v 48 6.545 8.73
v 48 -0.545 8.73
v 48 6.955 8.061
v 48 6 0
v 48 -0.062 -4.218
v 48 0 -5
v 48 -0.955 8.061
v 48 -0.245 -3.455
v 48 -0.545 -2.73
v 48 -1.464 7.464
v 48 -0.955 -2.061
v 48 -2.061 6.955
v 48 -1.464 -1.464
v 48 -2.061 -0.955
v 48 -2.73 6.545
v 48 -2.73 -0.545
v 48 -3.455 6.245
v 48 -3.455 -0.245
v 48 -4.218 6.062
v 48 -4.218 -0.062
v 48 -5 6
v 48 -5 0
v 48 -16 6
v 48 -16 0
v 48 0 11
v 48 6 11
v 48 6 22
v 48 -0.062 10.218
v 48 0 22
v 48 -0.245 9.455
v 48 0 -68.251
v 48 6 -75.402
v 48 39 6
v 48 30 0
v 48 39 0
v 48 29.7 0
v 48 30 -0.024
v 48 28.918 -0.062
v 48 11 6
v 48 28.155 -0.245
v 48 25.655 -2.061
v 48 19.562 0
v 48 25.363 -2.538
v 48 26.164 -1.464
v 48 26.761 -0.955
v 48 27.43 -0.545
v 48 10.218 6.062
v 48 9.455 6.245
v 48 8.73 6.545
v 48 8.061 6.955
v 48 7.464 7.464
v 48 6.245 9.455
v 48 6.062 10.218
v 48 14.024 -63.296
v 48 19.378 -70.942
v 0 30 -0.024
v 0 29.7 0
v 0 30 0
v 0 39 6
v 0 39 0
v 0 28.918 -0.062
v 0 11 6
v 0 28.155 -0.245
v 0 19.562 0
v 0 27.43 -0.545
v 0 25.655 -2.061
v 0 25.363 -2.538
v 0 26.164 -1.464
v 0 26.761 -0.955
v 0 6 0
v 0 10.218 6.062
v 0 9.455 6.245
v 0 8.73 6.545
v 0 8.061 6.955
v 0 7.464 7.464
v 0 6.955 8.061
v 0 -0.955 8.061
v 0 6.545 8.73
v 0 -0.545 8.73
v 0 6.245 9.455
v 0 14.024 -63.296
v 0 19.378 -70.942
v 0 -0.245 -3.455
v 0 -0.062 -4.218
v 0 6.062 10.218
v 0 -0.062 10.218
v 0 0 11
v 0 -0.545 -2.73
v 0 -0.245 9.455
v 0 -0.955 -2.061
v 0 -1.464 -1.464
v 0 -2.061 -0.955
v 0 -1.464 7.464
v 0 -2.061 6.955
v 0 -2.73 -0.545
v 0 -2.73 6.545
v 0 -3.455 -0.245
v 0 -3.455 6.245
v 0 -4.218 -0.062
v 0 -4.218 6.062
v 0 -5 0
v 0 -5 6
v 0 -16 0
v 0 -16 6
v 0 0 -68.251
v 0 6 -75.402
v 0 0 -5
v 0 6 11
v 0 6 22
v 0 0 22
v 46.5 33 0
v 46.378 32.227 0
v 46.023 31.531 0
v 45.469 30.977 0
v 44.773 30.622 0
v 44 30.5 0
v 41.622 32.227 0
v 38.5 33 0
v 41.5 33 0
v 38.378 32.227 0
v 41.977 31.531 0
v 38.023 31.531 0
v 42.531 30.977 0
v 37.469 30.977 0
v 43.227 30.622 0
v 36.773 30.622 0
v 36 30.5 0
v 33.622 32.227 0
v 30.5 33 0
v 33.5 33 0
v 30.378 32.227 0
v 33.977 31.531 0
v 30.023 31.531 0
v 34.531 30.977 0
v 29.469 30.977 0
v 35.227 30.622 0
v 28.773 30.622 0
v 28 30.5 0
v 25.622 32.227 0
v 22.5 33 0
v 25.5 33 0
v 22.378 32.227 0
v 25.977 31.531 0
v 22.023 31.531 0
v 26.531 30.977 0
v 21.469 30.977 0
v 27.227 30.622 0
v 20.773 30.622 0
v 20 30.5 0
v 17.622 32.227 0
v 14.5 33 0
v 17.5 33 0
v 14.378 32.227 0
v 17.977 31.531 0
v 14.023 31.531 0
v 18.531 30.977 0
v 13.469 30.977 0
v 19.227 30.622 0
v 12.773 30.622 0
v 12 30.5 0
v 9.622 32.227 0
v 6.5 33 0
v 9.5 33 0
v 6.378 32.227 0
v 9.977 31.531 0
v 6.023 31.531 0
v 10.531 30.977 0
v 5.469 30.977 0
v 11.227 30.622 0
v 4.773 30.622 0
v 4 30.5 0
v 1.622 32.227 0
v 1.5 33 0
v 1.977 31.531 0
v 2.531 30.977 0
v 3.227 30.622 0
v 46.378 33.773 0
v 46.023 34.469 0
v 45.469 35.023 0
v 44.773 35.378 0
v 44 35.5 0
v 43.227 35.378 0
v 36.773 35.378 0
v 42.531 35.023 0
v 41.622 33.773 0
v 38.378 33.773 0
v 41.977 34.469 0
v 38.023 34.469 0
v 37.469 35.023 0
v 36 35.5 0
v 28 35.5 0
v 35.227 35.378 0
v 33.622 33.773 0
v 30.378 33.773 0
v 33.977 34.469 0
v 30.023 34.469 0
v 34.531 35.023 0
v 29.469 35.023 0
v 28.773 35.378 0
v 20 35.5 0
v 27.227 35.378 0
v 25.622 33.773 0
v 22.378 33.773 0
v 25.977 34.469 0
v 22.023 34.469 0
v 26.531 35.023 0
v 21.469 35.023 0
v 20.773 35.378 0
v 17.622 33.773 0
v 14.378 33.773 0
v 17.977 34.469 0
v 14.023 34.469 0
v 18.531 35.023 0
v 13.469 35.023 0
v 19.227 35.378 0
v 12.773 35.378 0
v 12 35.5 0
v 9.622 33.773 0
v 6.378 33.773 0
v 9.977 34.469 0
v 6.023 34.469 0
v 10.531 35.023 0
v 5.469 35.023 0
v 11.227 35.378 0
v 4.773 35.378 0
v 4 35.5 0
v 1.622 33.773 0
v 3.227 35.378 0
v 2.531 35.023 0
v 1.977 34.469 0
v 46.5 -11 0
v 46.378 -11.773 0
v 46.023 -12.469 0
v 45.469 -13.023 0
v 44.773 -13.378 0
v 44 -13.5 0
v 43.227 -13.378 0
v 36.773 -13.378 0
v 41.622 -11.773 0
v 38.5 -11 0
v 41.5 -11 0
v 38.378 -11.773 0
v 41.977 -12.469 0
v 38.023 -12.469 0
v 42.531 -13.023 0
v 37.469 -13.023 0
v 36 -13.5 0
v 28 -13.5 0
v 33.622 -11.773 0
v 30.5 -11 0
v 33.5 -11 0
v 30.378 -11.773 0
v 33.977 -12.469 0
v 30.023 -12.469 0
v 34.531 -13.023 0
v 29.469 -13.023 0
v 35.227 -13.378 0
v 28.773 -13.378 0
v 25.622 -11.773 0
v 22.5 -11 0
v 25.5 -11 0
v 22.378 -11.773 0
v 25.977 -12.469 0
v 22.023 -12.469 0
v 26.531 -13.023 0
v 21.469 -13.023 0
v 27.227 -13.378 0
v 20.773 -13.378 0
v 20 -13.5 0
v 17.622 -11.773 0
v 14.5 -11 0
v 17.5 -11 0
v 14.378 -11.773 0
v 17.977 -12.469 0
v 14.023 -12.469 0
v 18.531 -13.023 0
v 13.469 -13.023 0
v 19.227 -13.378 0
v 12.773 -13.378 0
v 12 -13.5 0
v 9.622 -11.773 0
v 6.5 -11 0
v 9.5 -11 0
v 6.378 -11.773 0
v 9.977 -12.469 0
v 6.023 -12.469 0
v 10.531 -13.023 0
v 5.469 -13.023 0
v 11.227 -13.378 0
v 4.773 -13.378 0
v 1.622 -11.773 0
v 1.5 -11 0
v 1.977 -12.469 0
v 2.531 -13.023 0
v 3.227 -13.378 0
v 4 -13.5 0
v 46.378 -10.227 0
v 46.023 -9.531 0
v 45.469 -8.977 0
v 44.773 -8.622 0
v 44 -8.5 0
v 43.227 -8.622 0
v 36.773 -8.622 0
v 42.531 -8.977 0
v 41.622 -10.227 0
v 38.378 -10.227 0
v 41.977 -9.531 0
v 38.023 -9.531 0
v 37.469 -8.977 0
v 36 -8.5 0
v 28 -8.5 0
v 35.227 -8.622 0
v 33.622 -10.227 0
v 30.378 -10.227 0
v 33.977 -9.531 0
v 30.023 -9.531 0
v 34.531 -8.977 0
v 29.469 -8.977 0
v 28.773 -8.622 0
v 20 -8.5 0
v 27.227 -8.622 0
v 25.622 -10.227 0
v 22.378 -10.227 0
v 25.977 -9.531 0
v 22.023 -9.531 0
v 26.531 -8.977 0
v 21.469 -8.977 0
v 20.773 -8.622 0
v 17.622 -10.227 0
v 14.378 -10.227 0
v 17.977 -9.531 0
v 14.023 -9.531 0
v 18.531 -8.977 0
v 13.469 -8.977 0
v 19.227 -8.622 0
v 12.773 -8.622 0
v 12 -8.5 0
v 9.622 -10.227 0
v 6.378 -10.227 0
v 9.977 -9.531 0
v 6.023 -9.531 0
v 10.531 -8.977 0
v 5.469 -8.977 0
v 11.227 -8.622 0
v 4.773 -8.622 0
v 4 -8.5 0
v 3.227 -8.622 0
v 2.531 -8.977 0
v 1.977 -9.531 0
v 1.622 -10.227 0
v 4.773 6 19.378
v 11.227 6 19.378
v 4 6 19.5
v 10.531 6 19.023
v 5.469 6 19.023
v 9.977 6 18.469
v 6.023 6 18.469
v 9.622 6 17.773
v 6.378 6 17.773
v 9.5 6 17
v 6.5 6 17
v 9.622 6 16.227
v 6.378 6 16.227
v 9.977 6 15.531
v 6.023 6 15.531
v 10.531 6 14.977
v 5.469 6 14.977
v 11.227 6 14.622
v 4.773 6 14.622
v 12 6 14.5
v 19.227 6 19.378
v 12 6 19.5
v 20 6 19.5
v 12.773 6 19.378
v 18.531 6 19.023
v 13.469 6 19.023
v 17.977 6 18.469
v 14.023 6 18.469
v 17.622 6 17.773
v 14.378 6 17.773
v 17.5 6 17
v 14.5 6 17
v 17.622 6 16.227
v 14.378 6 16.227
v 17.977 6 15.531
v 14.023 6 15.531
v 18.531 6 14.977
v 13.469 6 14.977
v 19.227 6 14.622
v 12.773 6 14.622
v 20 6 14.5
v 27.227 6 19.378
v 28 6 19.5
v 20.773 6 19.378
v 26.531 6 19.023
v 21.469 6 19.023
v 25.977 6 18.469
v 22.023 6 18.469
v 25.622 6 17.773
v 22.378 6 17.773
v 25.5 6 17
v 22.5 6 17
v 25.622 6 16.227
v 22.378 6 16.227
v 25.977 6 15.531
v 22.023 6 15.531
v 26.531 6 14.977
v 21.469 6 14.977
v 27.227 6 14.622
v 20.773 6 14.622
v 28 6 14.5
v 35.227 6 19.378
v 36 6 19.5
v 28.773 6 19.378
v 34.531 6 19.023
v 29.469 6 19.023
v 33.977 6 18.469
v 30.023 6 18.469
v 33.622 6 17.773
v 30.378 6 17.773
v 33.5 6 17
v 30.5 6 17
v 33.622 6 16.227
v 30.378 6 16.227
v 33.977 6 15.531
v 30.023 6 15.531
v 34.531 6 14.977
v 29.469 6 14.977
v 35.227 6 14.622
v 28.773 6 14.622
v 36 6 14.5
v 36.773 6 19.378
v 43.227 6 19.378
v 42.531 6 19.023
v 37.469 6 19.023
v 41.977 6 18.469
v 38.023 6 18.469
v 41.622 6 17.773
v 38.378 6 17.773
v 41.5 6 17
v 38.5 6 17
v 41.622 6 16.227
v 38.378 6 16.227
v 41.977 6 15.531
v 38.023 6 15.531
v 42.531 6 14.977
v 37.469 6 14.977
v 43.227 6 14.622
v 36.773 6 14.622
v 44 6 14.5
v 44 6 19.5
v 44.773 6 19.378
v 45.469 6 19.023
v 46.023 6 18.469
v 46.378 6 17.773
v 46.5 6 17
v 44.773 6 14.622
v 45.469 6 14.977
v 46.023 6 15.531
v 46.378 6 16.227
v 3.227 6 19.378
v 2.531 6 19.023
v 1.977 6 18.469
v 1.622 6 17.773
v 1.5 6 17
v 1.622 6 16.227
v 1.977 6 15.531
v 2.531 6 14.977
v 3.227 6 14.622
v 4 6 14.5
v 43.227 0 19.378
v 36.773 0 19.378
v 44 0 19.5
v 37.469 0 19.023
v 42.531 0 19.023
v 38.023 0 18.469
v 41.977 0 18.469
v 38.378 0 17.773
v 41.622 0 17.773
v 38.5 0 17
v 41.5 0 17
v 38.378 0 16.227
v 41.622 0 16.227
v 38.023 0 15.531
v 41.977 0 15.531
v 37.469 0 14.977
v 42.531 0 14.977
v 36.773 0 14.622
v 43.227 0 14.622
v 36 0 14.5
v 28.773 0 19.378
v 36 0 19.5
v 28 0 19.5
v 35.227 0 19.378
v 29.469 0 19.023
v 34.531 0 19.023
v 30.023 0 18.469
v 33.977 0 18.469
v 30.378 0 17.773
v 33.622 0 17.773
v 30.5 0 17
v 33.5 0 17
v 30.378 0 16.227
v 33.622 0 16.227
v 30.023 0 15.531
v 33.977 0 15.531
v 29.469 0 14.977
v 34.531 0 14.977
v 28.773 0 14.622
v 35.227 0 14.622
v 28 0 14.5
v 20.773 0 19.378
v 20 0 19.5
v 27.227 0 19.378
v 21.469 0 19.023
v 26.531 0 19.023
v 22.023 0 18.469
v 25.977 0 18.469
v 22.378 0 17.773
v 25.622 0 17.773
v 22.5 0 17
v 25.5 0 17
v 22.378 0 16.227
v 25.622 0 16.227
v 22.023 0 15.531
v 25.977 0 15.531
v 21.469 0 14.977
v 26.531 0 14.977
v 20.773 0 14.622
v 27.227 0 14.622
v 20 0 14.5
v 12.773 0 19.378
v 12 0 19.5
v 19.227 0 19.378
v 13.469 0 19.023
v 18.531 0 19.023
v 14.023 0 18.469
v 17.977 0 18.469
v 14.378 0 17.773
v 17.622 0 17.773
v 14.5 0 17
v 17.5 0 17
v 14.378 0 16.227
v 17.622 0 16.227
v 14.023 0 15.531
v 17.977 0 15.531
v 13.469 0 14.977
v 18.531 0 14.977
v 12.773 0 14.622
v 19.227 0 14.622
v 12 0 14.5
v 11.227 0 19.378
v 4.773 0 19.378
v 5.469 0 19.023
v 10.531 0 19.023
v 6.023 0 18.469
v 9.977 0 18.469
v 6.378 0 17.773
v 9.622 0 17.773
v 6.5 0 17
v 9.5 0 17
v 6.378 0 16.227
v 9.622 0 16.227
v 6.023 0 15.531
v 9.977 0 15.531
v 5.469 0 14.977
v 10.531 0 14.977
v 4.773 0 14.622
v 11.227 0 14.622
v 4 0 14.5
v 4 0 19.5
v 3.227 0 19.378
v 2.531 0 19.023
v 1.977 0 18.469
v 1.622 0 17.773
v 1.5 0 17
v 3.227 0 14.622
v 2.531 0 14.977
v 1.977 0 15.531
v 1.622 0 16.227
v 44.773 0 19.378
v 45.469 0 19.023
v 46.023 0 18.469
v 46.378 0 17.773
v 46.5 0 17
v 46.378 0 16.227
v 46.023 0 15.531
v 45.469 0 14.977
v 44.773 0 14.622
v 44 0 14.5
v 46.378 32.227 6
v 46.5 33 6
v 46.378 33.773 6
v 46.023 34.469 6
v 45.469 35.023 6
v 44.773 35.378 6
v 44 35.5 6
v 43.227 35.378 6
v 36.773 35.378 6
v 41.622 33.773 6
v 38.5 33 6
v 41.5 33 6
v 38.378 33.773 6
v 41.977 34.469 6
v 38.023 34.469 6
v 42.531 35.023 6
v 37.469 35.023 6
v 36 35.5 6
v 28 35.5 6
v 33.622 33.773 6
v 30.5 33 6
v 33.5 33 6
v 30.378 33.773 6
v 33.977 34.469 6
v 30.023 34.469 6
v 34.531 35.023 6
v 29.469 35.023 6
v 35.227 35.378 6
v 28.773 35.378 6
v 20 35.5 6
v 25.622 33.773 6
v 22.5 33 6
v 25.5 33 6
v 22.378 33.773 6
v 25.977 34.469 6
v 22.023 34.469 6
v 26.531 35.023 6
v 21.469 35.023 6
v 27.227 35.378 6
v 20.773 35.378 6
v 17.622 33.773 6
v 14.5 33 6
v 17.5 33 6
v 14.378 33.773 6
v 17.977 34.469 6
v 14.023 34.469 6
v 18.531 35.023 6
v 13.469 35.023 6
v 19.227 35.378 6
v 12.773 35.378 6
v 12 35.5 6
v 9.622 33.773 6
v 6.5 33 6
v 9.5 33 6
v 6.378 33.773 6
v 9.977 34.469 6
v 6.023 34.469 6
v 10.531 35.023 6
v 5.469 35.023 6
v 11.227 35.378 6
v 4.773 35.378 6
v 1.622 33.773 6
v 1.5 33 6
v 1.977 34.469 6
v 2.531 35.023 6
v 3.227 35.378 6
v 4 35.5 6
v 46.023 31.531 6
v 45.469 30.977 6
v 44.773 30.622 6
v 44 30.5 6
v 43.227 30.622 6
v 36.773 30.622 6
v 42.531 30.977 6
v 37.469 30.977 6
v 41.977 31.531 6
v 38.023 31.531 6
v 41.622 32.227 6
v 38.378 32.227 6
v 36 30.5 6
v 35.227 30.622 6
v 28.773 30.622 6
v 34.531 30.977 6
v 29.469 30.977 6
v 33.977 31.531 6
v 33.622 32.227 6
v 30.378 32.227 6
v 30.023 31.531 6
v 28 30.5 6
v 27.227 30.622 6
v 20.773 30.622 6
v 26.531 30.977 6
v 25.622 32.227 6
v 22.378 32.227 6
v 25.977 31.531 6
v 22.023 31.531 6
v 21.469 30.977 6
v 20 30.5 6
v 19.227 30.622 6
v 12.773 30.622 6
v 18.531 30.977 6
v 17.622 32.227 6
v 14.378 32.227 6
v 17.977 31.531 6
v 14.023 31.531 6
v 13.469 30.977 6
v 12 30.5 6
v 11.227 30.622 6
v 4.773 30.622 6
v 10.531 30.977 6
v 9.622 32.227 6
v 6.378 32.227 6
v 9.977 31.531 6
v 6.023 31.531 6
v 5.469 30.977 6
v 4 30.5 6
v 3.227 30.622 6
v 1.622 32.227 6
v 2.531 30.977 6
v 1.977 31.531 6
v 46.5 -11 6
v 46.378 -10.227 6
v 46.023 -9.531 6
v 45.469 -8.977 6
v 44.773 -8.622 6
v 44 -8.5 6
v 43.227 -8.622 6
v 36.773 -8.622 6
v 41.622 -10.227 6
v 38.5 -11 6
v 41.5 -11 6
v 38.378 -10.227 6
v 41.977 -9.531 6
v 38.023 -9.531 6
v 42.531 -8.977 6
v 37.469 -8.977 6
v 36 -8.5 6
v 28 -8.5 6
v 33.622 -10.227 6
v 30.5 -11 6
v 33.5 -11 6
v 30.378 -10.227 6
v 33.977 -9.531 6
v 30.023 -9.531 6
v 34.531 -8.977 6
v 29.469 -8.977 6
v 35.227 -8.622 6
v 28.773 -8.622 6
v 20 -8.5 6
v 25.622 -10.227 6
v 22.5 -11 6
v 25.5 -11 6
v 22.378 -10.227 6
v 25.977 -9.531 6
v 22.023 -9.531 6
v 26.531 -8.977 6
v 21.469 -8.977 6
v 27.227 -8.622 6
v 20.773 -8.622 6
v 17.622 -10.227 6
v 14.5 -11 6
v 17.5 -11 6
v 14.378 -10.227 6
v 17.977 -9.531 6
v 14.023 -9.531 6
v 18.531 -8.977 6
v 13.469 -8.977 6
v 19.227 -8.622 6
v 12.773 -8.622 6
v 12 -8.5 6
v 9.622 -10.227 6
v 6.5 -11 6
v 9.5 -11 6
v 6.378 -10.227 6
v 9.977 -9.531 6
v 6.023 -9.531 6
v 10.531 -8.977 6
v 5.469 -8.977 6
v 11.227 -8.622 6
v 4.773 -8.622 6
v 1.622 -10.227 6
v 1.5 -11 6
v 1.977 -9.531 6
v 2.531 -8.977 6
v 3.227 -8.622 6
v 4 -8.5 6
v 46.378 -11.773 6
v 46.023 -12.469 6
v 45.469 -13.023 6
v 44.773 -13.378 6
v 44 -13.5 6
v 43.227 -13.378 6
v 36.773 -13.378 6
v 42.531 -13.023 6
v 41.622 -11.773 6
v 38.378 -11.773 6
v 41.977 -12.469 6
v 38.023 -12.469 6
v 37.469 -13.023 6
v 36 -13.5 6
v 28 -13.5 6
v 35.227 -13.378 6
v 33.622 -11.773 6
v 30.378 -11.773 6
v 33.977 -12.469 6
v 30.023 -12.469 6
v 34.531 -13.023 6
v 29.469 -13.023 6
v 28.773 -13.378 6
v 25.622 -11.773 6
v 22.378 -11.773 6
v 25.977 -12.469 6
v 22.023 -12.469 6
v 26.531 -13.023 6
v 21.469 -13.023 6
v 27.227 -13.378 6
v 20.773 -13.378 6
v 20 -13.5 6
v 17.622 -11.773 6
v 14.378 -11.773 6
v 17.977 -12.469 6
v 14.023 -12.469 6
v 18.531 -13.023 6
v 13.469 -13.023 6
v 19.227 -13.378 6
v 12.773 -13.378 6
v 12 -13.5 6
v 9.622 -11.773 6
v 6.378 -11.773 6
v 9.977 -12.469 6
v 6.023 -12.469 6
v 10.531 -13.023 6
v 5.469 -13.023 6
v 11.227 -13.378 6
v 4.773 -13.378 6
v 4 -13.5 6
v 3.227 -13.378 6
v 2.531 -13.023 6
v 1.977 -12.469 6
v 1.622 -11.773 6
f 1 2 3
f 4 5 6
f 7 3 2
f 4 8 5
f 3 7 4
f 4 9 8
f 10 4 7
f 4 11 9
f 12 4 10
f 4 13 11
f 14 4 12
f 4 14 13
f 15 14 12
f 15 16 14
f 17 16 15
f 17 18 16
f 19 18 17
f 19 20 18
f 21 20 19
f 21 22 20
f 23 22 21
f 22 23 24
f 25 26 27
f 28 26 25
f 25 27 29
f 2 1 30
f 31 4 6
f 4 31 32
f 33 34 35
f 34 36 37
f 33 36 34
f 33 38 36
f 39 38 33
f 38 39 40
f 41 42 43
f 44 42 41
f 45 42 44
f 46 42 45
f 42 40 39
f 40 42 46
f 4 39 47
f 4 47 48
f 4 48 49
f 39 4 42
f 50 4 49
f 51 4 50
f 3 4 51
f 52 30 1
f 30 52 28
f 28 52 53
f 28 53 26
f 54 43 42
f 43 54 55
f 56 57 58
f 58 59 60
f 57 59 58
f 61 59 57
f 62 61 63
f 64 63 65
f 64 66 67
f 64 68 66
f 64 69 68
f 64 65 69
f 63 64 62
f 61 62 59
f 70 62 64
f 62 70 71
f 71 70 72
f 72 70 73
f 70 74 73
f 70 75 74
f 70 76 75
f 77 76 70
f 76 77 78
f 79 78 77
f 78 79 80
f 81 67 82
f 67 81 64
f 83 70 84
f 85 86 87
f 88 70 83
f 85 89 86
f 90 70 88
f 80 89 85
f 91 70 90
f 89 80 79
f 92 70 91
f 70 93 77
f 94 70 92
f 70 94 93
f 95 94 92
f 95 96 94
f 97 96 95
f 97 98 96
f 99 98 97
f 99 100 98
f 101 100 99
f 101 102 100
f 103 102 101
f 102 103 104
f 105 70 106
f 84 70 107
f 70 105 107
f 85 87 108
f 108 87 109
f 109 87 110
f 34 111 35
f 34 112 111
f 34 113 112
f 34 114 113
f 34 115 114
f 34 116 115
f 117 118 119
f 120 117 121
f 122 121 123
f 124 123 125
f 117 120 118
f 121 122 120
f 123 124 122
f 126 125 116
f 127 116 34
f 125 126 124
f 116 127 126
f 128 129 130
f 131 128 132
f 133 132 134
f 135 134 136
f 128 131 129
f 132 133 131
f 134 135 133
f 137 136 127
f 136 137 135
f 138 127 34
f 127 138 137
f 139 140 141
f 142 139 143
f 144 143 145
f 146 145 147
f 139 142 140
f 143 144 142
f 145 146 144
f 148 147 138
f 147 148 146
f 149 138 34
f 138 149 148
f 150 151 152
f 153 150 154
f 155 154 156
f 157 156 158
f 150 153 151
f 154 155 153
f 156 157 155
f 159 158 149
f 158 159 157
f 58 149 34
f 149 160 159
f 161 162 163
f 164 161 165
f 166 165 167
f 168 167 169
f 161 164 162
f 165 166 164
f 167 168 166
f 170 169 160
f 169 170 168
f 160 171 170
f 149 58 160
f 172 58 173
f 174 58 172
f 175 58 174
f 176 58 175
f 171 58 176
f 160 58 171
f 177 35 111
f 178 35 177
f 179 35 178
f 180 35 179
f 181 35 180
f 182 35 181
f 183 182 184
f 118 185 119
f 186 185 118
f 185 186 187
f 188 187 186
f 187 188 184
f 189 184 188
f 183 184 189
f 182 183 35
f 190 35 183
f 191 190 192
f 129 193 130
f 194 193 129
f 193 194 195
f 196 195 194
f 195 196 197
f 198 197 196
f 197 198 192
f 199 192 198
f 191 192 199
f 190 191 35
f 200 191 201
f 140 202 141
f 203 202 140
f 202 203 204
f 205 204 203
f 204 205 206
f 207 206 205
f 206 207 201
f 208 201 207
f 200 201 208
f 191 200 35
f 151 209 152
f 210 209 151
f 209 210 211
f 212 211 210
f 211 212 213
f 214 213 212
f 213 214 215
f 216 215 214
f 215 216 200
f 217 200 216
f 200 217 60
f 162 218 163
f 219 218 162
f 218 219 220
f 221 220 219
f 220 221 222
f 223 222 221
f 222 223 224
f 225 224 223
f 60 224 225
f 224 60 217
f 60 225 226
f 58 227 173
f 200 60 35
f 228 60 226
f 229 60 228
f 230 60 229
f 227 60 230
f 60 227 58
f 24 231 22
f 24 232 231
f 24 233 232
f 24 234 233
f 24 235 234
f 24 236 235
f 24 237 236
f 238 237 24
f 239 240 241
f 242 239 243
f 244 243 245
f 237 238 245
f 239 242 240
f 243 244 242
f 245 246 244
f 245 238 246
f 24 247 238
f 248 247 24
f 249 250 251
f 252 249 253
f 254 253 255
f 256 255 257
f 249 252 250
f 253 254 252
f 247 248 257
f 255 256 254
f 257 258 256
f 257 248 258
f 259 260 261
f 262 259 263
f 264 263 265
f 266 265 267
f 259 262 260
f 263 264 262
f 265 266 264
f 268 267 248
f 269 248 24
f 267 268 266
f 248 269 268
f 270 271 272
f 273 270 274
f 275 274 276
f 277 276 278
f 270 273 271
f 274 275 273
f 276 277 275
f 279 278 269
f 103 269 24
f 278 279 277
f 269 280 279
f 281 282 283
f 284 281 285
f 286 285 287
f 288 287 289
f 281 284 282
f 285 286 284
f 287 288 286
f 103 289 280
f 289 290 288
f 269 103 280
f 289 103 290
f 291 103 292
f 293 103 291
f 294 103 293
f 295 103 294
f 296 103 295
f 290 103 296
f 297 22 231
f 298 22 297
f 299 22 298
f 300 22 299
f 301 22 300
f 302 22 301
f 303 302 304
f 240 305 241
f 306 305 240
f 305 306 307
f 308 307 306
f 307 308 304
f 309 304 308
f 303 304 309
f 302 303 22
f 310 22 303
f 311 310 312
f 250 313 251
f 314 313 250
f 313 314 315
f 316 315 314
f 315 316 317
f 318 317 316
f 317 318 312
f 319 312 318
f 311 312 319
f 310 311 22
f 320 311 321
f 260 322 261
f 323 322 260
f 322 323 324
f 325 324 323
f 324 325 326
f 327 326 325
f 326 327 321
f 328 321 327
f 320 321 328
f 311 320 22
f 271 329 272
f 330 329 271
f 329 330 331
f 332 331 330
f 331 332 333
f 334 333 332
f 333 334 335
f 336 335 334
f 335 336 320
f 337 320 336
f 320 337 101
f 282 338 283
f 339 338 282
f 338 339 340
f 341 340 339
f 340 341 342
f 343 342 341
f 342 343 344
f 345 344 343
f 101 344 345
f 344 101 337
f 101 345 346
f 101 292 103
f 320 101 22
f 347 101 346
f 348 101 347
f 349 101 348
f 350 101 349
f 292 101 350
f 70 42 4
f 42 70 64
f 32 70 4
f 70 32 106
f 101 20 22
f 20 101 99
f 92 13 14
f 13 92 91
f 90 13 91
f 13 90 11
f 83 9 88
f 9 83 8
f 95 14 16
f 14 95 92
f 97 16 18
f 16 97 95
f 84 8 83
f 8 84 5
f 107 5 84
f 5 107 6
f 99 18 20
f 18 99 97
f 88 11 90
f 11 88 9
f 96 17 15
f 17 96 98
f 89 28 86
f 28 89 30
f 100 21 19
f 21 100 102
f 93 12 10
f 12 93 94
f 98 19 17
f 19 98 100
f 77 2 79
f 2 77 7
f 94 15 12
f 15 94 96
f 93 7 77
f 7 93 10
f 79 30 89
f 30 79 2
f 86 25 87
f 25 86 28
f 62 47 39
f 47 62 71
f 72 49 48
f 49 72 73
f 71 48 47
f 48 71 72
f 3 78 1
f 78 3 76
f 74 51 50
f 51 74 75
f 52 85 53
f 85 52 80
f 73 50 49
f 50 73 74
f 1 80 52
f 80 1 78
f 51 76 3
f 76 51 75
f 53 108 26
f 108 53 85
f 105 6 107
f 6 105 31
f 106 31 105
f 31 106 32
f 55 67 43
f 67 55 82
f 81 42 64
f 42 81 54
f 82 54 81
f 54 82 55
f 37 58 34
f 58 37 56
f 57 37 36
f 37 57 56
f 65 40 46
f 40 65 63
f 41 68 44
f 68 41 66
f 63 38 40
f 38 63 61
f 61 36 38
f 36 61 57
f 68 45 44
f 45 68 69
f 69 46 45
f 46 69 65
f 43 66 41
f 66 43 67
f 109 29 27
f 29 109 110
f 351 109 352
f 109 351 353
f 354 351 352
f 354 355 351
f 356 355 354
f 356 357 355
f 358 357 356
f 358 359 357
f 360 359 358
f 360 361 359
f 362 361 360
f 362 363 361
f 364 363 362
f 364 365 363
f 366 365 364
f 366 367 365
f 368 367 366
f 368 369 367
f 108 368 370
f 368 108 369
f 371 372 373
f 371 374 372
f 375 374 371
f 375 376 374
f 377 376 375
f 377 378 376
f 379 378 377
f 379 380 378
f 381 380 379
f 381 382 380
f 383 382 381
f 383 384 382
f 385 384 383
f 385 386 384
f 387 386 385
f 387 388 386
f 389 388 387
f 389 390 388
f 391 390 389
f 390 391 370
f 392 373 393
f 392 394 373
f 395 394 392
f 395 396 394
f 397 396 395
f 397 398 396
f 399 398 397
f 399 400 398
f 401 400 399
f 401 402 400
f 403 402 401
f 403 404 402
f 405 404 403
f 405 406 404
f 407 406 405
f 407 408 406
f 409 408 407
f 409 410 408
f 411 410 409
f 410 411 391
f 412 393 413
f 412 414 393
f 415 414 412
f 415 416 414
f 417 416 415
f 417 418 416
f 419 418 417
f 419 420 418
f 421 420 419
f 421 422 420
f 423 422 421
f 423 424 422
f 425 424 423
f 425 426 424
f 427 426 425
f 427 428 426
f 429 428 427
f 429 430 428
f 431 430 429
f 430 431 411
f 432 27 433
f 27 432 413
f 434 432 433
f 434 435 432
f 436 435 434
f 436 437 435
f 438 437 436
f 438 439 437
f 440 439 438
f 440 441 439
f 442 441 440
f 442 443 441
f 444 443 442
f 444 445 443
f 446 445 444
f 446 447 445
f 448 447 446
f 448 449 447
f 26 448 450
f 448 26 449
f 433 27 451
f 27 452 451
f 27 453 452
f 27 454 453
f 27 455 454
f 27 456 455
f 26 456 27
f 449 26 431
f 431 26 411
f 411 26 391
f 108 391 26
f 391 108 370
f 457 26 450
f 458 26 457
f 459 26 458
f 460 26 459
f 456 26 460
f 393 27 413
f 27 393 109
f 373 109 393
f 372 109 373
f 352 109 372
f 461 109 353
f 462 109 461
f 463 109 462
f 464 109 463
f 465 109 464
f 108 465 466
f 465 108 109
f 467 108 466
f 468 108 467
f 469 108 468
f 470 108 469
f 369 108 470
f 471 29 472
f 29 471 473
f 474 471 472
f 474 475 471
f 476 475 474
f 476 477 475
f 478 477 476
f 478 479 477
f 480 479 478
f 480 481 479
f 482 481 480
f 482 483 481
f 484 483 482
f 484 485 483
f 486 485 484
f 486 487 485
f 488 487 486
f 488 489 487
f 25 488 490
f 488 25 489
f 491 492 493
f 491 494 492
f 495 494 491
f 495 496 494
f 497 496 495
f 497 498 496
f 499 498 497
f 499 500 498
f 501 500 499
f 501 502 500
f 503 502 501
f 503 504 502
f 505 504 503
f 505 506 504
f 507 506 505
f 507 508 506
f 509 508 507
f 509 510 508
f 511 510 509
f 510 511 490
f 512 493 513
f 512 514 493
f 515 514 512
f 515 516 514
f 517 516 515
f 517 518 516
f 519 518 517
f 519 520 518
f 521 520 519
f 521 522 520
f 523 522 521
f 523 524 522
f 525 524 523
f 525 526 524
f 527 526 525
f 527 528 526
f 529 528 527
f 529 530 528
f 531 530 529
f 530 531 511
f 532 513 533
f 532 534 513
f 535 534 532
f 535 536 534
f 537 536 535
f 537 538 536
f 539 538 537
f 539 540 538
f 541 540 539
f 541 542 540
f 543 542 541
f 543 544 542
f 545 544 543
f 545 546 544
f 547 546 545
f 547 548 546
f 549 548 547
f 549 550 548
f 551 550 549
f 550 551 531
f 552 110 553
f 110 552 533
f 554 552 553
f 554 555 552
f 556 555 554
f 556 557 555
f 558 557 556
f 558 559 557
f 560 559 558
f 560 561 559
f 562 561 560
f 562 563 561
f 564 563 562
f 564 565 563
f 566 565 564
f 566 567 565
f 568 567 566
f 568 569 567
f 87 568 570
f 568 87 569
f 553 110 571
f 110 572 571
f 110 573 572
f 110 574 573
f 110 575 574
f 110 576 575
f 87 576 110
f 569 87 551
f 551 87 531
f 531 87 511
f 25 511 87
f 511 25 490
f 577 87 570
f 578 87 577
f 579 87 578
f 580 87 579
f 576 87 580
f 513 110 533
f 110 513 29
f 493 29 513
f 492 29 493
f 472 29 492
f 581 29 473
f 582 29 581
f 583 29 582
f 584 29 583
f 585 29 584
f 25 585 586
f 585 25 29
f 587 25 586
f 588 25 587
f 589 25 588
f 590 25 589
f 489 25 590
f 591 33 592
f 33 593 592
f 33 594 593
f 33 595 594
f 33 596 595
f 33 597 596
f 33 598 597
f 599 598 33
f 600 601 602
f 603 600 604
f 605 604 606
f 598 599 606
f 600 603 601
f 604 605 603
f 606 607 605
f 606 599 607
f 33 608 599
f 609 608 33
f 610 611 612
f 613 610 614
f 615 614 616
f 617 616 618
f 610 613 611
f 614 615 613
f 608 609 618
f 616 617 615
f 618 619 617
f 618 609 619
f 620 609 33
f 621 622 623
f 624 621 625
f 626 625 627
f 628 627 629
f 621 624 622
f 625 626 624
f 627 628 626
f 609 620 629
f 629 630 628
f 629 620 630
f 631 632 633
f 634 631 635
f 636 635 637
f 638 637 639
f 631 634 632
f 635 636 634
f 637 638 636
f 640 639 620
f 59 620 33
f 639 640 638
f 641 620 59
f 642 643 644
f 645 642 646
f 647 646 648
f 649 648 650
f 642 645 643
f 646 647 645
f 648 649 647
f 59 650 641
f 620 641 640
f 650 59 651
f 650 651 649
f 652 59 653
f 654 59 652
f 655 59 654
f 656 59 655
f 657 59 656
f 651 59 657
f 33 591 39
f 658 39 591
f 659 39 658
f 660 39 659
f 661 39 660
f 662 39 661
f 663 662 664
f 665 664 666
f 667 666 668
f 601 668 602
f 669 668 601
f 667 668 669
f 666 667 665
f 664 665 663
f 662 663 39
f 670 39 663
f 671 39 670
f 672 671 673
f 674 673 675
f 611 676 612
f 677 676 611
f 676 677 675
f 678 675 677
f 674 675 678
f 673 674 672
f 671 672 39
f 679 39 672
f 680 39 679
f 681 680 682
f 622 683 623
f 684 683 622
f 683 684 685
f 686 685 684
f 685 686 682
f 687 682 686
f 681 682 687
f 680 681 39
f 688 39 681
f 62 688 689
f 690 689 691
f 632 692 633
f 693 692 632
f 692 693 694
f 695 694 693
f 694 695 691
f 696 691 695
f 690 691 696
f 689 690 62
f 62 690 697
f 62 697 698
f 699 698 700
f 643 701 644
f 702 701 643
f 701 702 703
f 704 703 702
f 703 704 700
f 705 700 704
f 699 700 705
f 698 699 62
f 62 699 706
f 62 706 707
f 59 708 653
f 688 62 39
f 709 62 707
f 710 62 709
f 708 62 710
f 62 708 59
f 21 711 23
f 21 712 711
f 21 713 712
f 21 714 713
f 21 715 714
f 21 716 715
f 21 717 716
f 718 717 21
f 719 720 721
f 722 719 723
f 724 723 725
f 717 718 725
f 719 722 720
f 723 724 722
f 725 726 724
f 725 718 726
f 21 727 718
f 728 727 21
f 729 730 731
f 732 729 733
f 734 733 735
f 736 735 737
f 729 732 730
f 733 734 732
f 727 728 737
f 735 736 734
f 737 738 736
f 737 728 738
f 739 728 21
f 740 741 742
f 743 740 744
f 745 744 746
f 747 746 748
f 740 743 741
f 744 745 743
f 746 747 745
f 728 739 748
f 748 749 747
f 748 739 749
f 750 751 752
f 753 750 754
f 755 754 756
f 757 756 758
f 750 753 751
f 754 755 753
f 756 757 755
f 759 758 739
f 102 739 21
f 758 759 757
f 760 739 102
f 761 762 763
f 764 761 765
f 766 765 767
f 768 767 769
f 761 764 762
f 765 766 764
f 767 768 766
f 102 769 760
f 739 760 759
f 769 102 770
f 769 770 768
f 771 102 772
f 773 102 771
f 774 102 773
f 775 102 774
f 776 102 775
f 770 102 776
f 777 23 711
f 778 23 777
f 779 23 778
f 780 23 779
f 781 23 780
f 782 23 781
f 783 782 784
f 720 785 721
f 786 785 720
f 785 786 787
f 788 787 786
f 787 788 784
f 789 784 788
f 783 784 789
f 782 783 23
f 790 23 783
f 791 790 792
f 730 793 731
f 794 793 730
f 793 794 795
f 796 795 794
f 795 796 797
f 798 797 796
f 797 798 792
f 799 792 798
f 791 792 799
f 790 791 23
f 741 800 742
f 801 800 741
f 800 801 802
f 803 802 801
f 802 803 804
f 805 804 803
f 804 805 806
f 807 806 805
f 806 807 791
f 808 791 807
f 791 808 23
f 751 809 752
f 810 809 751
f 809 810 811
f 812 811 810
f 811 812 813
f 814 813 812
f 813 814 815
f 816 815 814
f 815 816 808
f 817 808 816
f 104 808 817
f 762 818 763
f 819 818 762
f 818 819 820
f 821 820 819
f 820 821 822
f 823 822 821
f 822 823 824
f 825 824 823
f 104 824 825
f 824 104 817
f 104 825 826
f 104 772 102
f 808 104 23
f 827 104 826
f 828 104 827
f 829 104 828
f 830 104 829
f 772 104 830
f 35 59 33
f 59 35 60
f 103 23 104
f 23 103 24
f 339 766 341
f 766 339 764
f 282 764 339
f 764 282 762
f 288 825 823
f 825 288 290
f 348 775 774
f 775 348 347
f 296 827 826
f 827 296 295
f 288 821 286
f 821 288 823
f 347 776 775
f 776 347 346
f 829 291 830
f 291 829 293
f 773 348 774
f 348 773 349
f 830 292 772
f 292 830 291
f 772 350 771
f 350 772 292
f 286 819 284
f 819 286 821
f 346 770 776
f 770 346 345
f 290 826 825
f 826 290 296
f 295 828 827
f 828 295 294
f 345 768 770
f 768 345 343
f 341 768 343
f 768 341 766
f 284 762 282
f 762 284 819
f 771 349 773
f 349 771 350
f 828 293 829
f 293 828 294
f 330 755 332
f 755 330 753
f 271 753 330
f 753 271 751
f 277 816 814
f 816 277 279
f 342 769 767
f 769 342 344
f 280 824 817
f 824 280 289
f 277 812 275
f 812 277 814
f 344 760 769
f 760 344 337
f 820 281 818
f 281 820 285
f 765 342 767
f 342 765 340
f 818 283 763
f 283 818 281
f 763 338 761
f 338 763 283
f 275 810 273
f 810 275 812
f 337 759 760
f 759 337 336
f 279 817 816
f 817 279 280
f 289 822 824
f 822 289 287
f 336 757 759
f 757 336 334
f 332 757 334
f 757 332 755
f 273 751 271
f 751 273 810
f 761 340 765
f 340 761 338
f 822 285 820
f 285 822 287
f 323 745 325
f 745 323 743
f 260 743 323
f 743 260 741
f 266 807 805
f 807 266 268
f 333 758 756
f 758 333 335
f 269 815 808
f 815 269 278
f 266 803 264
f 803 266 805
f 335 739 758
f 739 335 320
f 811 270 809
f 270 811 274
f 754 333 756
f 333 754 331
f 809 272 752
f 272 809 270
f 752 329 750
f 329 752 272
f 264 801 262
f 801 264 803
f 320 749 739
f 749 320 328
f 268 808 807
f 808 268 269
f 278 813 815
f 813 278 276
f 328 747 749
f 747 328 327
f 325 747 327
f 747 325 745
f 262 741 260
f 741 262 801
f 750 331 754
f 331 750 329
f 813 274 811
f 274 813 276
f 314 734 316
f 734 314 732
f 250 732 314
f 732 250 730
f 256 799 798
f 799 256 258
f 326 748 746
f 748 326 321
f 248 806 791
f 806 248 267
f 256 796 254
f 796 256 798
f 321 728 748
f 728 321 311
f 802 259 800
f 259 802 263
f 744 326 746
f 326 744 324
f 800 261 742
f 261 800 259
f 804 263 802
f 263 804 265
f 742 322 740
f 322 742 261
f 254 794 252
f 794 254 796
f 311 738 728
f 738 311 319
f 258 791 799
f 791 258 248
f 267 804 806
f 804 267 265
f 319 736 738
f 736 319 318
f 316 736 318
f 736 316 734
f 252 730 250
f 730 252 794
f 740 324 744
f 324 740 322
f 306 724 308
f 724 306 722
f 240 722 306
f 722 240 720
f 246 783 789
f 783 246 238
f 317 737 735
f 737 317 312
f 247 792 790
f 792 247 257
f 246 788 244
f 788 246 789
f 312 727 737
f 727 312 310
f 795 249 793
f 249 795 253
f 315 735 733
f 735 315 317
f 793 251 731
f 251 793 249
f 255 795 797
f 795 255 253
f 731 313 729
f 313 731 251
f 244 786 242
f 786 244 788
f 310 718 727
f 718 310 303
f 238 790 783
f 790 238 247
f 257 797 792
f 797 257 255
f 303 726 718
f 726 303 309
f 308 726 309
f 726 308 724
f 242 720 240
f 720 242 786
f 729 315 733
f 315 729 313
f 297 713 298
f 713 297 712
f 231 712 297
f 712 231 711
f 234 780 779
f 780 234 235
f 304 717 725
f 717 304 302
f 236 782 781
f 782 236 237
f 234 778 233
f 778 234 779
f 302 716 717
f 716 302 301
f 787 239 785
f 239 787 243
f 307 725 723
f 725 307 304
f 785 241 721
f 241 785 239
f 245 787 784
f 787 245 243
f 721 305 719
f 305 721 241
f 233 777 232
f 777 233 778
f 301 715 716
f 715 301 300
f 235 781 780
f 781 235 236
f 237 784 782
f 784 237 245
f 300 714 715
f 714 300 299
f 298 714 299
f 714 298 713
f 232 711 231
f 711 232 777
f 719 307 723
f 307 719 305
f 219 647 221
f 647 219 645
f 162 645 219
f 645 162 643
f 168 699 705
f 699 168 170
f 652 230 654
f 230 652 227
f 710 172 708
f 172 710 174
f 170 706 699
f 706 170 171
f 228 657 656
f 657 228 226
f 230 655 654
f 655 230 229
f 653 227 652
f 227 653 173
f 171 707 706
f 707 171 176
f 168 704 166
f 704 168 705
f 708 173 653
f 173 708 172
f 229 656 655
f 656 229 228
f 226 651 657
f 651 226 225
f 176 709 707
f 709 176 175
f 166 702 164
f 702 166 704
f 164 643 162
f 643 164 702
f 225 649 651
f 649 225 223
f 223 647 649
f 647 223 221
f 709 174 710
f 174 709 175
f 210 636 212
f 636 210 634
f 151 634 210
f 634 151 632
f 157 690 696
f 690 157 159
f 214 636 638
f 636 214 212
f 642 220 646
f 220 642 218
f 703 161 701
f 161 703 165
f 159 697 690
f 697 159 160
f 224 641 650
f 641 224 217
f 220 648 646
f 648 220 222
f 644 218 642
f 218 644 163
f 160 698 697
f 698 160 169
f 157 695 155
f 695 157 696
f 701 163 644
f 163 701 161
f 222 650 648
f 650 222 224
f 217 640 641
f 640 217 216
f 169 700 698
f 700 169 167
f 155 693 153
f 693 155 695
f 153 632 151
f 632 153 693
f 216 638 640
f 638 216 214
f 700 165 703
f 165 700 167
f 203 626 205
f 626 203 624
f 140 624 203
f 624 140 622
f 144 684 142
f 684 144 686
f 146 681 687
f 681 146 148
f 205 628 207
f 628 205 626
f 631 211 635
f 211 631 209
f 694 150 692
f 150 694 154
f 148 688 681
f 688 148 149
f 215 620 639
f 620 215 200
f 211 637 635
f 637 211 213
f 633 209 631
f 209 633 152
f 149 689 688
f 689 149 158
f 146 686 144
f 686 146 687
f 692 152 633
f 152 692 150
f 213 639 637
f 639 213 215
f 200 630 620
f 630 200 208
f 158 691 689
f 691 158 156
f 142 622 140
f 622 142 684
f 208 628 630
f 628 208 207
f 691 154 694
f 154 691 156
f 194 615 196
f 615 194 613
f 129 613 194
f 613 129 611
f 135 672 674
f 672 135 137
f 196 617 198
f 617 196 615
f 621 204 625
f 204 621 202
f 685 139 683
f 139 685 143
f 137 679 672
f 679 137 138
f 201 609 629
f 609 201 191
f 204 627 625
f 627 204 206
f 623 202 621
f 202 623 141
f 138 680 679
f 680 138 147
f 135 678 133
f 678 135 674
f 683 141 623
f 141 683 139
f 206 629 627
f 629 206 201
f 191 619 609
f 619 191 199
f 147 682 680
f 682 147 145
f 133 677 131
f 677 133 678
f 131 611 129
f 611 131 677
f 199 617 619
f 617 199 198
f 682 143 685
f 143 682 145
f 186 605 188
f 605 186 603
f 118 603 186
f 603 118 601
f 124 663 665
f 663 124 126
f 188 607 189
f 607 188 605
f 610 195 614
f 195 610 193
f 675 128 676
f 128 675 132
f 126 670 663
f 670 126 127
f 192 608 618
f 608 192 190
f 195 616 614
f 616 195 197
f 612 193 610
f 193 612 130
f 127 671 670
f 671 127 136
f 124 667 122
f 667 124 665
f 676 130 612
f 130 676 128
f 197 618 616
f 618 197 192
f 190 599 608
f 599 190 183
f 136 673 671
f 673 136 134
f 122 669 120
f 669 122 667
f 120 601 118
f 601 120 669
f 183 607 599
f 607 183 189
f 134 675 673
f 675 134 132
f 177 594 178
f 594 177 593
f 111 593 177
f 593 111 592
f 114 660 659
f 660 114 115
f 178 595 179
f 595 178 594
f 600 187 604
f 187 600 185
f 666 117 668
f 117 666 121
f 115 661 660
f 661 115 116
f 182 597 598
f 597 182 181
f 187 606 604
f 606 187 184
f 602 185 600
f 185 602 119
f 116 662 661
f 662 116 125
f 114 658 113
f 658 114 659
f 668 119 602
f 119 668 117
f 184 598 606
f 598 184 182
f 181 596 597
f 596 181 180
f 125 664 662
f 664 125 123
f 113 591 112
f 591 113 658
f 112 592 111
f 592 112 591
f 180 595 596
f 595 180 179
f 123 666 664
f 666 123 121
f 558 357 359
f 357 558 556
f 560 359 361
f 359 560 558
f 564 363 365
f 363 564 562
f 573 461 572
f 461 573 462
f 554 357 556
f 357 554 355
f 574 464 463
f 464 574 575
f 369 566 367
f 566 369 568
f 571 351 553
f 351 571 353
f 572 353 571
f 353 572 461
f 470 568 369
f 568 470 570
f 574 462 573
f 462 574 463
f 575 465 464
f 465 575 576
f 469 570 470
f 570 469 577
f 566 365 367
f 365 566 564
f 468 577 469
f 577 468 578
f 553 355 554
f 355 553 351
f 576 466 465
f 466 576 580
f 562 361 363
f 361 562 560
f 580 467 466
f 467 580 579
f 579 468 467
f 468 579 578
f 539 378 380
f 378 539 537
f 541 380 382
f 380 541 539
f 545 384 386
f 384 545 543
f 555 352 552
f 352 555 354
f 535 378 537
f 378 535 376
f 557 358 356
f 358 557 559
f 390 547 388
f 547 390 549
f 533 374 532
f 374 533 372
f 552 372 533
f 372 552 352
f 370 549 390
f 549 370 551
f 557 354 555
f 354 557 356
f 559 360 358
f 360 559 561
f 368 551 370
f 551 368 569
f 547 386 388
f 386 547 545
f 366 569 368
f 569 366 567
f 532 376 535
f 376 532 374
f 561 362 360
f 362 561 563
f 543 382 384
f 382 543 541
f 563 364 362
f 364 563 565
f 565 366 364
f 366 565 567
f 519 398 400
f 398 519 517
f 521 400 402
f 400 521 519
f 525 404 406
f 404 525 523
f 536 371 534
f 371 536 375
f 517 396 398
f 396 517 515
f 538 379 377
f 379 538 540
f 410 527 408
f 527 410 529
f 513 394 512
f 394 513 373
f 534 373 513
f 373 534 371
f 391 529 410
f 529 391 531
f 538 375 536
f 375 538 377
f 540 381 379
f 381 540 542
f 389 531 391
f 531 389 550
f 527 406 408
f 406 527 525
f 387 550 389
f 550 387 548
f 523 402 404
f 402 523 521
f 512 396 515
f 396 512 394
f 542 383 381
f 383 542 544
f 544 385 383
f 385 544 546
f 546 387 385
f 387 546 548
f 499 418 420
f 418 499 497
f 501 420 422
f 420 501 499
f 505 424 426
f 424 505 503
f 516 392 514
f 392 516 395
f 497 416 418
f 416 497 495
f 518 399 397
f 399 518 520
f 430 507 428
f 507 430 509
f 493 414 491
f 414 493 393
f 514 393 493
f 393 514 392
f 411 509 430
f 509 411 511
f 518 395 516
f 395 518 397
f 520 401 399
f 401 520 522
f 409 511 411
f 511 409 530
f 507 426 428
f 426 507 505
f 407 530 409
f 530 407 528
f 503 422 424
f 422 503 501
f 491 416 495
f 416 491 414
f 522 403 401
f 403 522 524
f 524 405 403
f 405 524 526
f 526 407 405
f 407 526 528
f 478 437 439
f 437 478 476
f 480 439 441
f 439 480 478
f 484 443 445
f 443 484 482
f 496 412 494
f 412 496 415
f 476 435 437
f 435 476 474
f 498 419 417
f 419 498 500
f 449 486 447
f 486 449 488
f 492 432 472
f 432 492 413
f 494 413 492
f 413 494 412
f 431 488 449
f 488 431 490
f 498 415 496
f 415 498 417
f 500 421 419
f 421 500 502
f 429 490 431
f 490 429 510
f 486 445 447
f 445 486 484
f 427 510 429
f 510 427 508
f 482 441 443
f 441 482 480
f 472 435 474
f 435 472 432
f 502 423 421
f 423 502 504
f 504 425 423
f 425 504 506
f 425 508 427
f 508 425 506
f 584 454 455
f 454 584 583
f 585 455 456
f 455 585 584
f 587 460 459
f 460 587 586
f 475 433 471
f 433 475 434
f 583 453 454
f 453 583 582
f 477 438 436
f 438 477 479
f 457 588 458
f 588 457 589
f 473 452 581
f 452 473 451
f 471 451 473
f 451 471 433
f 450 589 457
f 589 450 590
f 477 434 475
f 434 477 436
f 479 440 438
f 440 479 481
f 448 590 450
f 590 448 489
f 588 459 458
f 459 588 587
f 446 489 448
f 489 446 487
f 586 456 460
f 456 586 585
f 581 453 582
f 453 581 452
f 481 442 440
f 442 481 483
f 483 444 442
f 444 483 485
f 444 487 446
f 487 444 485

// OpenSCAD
module tubeBracket(holeCount, glassThickness) {
  width = holeCount * 8;
  spacing = glassThickness + 3;
  thickness = 6;
//  translate([0, 0, width])
//  rotate(90, [0, 1, 0])
  difference() {
    union() {
      // 3 rounded inside corners, 1 square corner
      translate([0, -5, -5]) {
        difference() {
          cube([width, 10 + thickness, 10 + thickness]);
           translate([-1, 11, -1])
            cube([width + 2, 6, 6]);
          translate([-1,0,0])
            rotate(90, [0,1,0])
              cylinder(h=width + 2, r=5, $fn=40);
          translate([-1, 0, 10 + thickness])
            rotate(90, [0,1,0])
              cylinder(h=width + 2, r=5, $fn=40);
          translate([-1, 10 + thickness, 10 + thickness])
            rotate(90, [0,1,0])
              cylinder(h=width + 2, r=5, $fn=40);        
        }
      }
      cube([width, thickness, 22]); // vertical top
      translate([0, -16,0])
        cube([width, 42 + spacing, thickness]);  // horizontal
      translate([0, 0, -80]) {
        difference() {
          cube([width, thickness, 80]);  // vertical down
          translate([-5,1,-5])
          rotate(40, [1,0,0])
            cube([width + 10, 10, 20]);
        }
      }
      translate([0, spacing , -75])
        rotate(-5, [1, 0, 0])
          difference() {
            cube([width, thickness, 80]);
            translate([-5,1,-5])
            rotate(40, [1,0,0])
              cube([width + 10, 10, 20]);
          }
      translate([0, spacing + 2*thickness - 2, -5]) {
        difference() {
          cube([width, 7, 6]);
          translate([-1, 6.7, 0])
            rotate(90, [0, 1, 0])
              cylinder(h=width+2, r=5, $fn=40);
        }
      }
    };
    holes(holeCount = holeCount, rotation = 0, translateY = -11, translateZ = -1);
    holes(holeCount = holeCount, rotation = 0, translateY = 20 + spacing, translateZ = -1);
    holes(holeCount = holeCount, rotation = 90, translateY = 10, translateZ = 17);
  }
}

module holes(holeCount, rotation, translateY, translateZ) {
  for(hole = [1 : holeCount]) {
    translate([hole*8 - 4, translateY, translateZ])
      rotate(rotation, [1, 0, 0])
        cylinder(h=12, r = 2.5, $fn=20);
  }
}


tubeBracket(holeCount = 6, glassThickness = 10);
